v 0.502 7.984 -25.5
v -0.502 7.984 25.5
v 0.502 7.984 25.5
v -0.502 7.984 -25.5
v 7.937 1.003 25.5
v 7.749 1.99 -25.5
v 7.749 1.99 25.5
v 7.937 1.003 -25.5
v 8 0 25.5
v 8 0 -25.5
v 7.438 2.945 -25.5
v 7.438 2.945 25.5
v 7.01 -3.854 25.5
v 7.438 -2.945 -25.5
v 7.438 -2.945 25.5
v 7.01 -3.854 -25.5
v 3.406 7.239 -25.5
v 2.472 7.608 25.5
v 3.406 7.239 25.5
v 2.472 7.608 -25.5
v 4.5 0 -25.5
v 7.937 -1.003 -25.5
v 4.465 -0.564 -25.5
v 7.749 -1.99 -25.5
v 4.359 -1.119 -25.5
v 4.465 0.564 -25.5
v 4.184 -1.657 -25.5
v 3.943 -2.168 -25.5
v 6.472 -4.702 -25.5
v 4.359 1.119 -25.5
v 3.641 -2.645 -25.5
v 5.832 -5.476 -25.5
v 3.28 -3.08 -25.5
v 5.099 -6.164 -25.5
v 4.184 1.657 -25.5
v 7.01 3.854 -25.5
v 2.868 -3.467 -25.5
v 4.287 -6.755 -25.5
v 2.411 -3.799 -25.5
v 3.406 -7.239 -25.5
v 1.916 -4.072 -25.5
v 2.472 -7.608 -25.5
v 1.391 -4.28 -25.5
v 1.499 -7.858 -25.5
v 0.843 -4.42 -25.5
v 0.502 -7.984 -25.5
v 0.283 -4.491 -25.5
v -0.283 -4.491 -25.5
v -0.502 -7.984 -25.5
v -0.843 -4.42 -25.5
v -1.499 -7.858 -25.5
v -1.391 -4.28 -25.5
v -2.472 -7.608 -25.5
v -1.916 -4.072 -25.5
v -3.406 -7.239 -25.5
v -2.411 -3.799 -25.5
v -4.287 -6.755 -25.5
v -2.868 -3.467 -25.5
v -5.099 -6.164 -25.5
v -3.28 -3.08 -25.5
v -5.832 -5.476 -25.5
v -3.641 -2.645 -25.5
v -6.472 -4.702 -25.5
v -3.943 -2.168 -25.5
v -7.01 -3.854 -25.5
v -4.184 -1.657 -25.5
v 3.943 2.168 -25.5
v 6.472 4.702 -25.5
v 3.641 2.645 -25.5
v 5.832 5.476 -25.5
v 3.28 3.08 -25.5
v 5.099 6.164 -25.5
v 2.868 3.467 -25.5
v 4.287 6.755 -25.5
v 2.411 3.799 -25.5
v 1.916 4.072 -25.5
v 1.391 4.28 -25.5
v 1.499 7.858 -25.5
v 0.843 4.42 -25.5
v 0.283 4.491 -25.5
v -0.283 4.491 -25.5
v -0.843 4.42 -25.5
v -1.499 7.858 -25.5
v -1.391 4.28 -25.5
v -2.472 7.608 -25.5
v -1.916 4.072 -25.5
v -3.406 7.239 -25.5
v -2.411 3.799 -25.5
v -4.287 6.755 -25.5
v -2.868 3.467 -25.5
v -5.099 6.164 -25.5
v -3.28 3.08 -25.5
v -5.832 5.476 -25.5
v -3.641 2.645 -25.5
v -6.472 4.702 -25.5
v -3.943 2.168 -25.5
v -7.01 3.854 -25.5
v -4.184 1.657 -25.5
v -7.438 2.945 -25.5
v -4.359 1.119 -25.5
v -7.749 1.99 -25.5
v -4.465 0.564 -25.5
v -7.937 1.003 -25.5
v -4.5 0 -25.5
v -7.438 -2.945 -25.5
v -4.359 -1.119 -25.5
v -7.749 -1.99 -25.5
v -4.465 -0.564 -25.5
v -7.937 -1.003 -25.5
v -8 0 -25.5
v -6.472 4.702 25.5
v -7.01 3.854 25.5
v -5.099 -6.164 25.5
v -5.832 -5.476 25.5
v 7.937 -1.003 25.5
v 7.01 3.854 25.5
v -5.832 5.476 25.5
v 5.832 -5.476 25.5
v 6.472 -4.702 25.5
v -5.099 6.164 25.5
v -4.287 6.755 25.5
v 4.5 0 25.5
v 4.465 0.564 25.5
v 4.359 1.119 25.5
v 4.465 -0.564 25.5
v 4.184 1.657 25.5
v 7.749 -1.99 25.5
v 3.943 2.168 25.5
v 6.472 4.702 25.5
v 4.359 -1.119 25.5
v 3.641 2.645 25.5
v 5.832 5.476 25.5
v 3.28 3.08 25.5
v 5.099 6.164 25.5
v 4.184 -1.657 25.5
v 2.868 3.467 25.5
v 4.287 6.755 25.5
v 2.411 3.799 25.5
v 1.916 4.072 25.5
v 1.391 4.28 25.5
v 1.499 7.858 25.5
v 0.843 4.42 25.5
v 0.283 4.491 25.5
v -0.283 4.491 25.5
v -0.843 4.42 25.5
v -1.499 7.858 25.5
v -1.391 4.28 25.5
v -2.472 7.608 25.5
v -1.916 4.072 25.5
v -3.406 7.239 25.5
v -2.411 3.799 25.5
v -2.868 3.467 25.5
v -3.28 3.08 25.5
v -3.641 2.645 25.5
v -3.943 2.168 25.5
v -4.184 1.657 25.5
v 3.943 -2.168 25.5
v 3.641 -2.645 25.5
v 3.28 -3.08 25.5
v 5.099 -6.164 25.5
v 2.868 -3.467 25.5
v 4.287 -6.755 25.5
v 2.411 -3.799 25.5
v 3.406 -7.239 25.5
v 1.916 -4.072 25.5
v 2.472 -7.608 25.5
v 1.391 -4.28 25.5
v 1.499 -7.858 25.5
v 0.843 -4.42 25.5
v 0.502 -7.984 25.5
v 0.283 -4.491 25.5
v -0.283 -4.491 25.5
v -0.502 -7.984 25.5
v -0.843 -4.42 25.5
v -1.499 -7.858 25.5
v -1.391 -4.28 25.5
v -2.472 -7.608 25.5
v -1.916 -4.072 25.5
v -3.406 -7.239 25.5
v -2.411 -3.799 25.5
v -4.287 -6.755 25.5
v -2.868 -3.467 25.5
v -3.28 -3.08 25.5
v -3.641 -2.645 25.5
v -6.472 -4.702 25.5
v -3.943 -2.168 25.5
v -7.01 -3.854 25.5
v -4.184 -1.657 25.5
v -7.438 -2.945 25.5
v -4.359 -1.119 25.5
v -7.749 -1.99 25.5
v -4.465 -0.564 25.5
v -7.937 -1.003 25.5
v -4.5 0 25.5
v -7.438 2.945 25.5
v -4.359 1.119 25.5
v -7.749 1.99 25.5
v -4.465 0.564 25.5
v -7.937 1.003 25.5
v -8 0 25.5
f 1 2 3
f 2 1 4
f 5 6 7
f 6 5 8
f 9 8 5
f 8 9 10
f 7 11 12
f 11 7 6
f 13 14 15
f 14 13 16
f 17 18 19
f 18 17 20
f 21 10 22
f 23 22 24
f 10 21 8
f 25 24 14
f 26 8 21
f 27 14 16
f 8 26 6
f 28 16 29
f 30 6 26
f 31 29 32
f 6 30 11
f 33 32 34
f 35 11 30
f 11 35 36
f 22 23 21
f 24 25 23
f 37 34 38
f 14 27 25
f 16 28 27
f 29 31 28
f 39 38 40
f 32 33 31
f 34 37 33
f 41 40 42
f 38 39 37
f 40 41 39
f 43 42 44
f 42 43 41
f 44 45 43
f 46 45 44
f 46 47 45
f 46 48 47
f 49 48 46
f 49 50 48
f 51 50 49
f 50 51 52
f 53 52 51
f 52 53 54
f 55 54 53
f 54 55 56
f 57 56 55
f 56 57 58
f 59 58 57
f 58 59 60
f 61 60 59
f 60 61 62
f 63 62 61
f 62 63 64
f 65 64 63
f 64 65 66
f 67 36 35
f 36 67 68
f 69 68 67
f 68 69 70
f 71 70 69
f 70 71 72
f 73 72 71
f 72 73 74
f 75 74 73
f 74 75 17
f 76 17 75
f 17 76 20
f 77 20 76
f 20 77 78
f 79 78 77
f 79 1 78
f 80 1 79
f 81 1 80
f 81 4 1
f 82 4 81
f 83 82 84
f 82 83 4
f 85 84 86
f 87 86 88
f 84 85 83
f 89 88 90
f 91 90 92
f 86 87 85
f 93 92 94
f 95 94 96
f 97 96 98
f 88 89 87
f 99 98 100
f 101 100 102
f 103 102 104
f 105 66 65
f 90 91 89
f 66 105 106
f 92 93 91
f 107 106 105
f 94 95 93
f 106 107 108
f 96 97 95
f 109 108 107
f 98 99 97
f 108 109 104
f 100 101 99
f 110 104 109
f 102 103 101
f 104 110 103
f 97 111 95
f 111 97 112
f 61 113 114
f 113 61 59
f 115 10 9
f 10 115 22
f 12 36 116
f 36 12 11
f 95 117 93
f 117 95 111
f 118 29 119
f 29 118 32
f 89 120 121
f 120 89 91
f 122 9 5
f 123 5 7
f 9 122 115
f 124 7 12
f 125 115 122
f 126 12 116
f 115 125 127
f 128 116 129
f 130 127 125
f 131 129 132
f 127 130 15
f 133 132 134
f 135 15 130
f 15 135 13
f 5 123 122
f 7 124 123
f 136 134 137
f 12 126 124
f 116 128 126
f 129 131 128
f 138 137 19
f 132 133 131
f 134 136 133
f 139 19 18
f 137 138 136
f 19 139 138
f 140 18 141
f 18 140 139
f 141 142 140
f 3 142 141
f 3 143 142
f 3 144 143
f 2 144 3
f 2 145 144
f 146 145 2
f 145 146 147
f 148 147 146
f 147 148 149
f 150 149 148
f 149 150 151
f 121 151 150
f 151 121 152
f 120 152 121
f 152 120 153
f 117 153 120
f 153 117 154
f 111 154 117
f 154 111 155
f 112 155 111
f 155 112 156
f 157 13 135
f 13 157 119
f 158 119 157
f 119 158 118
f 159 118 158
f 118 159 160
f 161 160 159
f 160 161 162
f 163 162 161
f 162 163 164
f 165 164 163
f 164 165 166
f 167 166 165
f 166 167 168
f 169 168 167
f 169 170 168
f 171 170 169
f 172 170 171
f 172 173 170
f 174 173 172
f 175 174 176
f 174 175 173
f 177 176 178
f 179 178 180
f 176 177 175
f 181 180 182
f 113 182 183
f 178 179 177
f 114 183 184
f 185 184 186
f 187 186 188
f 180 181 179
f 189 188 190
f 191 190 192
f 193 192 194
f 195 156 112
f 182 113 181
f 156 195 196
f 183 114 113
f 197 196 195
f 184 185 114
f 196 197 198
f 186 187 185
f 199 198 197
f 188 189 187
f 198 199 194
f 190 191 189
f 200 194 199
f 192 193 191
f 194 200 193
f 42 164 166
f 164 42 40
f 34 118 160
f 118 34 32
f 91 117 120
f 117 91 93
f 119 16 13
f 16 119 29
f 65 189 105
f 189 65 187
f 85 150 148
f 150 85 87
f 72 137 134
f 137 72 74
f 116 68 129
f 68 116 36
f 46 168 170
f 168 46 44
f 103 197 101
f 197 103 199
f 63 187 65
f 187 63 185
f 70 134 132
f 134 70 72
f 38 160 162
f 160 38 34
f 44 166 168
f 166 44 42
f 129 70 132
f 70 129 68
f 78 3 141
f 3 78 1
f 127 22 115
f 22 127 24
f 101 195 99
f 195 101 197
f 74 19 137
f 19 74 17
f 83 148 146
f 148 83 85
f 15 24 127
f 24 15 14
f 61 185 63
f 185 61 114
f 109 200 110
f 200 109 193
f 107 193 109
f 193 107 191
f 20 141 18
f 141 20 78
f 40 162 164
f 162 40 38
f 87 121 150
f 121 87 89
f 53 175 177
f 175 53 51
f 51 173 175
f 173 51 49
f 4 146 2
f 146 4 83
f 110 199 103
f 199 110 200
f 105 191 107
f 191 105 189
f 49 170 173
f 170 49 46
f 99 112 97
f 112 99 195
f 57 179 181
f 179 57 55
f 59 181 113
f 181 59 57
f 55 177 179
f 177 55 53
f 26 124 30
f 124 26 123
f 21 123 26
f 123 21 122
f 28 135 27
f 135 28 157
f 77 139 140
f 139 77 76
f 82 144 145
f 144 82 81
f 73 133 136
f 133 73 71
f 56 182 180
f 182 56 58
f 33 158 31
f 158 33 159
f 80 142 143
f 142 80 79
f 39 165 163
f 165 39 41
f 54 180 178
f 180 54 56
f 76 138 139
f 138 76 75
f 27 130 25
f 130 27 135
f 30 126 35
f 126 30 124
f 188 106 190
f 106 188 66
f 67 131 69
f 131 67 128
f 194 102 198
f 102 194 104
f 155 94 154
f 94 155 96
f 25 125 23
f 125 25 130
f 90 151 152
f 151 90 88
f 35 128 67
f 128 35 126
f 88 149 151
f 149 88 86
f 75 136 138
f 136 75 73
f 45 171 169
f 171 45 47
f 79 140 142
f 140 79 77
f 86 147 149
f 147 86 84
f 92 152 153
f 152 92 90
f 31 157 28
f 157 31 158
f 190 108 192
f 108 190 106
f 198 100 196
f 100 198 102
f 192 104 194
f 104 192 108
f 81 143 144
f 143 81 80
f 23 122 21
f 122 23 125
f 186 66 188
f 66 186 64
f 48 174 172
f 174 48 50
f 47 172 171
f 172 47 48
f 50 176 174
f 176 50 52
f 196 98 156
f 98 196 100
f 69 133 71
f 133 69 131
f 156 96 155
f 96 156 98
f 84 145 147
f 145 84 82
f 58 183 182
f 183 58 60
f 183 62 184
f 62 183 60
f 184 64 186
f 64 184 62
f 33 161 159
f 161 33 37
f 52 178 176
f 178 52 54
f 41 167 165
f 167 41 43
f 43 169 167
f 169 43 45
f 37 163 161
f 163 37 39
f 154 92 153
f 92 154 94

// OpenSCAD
$fn = 50;


difference() {
	union() {
		translate(v = [0, 0, -25.5000000000]) {
			cylinder(h = 51, r = 8.0000000000);
		}
	}
	union() {
		translate(v = [0, 0, -100.0000000000]) {
			cylinder(h = 200, r = 4.5000000000);
		}
	}
}
